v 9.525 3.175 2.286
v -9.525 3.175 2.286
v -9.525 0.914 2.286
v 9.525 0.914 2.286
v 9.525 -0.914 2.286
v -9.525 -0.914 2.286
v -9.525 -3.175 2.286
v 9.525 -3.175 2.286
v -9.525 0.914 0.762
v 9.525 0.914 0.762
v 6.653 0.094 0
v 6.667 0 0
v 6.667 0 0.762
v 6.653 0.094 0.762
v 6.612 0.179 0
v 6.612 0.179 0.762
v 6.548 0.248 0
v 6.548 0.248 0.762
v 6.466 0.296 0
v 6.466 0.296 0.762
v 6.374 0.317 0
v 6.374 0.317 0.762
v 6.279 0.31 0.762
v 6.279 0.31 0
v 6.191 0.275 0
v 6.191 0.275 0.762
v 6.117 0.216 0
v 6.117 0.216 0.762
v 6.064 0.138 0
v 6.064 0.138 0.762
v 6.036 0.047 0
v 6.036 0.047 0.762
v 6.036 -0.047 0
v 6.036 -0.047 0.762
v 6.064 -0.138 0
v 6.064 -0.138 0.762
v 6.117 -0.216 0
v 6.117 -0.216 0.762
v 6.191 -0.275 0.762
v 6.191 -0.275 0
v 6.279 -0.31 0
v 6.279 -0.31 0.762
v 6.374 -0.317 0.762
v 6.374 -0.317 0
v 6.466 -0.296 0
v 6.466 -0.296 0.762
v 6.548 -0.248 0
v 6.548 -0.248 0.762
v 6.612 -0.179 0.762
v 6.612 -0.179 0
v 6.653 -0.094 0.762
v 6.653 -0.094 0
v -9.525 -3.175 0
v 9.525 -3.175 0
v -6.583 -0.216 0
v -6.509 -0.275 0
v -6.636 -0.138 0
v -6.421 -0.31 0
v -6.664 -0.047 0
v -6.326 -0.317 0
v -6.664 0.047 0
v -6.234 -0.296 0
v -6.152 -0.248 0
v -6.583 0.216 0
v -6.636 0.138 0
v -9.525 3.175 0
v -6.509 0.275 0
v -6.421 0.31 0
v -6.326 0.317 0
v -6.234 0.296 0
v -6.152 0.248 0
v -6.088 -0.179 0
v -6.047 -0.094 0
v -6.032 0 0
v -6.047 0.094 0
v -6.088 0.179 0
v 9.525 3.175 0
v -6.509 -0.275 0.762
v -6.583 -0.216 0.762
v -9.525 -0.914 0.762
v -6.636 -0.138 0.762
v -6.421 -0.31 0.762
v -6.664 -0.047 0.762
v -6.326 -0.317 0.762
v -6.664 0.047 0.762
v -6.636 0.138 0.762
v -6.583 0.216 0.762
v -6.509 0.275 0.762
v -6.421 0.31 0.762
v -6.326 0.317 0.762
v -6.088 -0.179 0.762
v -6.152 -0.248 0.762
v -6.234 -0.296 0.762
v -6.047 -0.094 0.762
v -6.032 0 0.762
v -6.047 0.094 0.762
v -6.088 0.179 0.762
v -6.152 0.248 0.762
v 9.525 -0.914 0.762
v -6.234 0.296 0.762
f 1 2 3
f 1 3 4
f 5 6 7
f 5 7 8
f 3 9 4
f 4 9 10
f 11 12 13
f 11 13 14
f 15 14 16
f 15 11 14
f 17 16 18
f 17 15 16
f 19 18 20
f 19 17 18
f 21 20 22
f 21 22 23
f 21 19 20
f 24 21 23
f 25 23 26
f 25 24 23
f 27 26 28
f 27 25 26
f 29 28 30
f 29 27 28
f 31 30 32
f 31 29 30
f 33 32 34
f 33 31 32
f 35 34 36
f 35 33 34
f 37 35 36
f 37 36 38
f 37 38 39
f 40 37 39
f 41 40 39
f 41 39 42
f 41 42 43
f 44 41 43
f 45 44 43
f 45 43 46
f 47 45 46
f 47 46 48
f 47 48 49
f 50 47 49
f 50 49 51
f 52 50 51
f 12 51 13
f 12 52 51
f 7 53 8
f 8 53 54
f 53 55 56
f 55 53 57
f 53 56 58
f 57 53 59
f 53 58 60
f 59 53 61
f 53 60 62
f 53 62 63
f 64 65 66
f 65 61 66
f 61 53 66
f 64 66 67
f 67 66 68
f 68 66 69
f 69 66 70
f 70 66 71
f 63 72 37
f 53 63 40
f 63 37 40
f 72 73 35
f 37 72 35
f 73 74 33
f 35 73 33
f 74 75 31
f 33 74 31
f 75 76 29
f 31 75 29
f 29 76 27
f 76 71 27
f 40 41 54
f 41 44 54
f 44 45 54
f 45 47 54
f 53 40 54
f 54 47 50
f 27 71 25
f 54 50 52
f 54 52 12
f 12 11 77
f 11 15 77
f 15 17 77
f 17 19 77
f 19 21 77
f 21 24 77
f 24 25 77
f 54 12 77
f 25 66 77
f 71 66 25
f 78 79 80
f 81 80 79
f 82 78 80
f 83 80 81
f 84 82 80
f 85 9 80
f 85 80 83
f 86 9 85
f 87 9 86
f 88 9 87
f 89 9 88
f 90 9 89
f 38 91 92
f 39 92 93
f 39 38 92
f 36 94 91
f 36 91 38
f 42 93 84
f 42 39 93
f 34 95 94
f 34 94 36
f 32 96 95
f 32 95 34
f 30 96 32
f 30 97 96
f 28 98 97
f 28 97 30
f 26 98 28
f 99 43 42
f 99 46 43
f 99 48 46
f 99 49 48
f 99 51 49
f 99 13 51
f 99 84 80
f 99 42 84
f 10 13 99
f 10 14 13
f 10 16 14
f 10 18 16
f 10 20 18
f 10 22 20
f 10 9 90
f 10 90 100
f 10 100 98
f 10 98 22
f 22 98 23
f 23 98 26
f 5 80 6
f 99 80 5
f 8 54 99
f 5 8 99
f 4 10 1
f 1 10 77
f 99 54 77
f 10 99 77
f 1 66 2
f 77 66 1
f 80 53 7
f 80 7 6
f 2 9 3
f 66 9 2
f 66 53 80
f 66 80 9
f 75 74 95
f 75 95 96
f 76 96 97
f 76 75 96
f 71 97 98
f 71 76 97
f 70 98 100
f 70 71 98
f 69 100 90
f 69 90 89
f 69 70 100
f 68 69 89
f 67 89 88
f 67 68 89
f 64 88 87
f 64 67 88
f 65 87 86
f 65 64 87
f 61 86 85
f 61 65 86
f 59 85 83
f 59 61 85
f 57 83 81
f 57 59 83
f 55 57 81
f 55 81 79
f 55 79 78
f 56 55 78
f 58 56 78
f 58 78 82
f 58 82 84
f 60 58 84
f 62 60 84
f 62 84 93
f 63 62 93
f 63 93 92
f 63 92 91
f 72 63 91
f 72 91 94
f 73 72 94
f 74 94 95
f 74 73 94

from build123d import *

# Parameters (mm, degrees)
F0_W     = 19.05
F0_H     = 1.8288
F0_R     = 0.3175
F1_DEPTH = 0.762
F0_H_2   = 2.2606
F2_DEPTH = 2.286


with BuildPart() as f1:
    # F0 (on Top) → F1 (new body)
    with BuildSketch(Plane.XY):
        Rectangle(F0_W, F0_H)
        with Locations((-6.35, 0)):
            Circle(F0_R, mode=Mode.SUBTRACT)
        with Locations((6.35, 0)):
            Circle(F0_R, mode=Mode.SUBTRACT)
    extrude(amount=F1_DEPTH)

    # F0 (on Top) → F2 (join)
    with BuildSketch(Plane.XY):
        with Locations((0, -2.0447)):
            Rectangle(F0_W, F0_H_2)
        with Locations((0, 2.0447)):
            Rectangle(F0_W, F0_H_2)
    extrude(amount=F2_DEPTH)


solid = f1.part
